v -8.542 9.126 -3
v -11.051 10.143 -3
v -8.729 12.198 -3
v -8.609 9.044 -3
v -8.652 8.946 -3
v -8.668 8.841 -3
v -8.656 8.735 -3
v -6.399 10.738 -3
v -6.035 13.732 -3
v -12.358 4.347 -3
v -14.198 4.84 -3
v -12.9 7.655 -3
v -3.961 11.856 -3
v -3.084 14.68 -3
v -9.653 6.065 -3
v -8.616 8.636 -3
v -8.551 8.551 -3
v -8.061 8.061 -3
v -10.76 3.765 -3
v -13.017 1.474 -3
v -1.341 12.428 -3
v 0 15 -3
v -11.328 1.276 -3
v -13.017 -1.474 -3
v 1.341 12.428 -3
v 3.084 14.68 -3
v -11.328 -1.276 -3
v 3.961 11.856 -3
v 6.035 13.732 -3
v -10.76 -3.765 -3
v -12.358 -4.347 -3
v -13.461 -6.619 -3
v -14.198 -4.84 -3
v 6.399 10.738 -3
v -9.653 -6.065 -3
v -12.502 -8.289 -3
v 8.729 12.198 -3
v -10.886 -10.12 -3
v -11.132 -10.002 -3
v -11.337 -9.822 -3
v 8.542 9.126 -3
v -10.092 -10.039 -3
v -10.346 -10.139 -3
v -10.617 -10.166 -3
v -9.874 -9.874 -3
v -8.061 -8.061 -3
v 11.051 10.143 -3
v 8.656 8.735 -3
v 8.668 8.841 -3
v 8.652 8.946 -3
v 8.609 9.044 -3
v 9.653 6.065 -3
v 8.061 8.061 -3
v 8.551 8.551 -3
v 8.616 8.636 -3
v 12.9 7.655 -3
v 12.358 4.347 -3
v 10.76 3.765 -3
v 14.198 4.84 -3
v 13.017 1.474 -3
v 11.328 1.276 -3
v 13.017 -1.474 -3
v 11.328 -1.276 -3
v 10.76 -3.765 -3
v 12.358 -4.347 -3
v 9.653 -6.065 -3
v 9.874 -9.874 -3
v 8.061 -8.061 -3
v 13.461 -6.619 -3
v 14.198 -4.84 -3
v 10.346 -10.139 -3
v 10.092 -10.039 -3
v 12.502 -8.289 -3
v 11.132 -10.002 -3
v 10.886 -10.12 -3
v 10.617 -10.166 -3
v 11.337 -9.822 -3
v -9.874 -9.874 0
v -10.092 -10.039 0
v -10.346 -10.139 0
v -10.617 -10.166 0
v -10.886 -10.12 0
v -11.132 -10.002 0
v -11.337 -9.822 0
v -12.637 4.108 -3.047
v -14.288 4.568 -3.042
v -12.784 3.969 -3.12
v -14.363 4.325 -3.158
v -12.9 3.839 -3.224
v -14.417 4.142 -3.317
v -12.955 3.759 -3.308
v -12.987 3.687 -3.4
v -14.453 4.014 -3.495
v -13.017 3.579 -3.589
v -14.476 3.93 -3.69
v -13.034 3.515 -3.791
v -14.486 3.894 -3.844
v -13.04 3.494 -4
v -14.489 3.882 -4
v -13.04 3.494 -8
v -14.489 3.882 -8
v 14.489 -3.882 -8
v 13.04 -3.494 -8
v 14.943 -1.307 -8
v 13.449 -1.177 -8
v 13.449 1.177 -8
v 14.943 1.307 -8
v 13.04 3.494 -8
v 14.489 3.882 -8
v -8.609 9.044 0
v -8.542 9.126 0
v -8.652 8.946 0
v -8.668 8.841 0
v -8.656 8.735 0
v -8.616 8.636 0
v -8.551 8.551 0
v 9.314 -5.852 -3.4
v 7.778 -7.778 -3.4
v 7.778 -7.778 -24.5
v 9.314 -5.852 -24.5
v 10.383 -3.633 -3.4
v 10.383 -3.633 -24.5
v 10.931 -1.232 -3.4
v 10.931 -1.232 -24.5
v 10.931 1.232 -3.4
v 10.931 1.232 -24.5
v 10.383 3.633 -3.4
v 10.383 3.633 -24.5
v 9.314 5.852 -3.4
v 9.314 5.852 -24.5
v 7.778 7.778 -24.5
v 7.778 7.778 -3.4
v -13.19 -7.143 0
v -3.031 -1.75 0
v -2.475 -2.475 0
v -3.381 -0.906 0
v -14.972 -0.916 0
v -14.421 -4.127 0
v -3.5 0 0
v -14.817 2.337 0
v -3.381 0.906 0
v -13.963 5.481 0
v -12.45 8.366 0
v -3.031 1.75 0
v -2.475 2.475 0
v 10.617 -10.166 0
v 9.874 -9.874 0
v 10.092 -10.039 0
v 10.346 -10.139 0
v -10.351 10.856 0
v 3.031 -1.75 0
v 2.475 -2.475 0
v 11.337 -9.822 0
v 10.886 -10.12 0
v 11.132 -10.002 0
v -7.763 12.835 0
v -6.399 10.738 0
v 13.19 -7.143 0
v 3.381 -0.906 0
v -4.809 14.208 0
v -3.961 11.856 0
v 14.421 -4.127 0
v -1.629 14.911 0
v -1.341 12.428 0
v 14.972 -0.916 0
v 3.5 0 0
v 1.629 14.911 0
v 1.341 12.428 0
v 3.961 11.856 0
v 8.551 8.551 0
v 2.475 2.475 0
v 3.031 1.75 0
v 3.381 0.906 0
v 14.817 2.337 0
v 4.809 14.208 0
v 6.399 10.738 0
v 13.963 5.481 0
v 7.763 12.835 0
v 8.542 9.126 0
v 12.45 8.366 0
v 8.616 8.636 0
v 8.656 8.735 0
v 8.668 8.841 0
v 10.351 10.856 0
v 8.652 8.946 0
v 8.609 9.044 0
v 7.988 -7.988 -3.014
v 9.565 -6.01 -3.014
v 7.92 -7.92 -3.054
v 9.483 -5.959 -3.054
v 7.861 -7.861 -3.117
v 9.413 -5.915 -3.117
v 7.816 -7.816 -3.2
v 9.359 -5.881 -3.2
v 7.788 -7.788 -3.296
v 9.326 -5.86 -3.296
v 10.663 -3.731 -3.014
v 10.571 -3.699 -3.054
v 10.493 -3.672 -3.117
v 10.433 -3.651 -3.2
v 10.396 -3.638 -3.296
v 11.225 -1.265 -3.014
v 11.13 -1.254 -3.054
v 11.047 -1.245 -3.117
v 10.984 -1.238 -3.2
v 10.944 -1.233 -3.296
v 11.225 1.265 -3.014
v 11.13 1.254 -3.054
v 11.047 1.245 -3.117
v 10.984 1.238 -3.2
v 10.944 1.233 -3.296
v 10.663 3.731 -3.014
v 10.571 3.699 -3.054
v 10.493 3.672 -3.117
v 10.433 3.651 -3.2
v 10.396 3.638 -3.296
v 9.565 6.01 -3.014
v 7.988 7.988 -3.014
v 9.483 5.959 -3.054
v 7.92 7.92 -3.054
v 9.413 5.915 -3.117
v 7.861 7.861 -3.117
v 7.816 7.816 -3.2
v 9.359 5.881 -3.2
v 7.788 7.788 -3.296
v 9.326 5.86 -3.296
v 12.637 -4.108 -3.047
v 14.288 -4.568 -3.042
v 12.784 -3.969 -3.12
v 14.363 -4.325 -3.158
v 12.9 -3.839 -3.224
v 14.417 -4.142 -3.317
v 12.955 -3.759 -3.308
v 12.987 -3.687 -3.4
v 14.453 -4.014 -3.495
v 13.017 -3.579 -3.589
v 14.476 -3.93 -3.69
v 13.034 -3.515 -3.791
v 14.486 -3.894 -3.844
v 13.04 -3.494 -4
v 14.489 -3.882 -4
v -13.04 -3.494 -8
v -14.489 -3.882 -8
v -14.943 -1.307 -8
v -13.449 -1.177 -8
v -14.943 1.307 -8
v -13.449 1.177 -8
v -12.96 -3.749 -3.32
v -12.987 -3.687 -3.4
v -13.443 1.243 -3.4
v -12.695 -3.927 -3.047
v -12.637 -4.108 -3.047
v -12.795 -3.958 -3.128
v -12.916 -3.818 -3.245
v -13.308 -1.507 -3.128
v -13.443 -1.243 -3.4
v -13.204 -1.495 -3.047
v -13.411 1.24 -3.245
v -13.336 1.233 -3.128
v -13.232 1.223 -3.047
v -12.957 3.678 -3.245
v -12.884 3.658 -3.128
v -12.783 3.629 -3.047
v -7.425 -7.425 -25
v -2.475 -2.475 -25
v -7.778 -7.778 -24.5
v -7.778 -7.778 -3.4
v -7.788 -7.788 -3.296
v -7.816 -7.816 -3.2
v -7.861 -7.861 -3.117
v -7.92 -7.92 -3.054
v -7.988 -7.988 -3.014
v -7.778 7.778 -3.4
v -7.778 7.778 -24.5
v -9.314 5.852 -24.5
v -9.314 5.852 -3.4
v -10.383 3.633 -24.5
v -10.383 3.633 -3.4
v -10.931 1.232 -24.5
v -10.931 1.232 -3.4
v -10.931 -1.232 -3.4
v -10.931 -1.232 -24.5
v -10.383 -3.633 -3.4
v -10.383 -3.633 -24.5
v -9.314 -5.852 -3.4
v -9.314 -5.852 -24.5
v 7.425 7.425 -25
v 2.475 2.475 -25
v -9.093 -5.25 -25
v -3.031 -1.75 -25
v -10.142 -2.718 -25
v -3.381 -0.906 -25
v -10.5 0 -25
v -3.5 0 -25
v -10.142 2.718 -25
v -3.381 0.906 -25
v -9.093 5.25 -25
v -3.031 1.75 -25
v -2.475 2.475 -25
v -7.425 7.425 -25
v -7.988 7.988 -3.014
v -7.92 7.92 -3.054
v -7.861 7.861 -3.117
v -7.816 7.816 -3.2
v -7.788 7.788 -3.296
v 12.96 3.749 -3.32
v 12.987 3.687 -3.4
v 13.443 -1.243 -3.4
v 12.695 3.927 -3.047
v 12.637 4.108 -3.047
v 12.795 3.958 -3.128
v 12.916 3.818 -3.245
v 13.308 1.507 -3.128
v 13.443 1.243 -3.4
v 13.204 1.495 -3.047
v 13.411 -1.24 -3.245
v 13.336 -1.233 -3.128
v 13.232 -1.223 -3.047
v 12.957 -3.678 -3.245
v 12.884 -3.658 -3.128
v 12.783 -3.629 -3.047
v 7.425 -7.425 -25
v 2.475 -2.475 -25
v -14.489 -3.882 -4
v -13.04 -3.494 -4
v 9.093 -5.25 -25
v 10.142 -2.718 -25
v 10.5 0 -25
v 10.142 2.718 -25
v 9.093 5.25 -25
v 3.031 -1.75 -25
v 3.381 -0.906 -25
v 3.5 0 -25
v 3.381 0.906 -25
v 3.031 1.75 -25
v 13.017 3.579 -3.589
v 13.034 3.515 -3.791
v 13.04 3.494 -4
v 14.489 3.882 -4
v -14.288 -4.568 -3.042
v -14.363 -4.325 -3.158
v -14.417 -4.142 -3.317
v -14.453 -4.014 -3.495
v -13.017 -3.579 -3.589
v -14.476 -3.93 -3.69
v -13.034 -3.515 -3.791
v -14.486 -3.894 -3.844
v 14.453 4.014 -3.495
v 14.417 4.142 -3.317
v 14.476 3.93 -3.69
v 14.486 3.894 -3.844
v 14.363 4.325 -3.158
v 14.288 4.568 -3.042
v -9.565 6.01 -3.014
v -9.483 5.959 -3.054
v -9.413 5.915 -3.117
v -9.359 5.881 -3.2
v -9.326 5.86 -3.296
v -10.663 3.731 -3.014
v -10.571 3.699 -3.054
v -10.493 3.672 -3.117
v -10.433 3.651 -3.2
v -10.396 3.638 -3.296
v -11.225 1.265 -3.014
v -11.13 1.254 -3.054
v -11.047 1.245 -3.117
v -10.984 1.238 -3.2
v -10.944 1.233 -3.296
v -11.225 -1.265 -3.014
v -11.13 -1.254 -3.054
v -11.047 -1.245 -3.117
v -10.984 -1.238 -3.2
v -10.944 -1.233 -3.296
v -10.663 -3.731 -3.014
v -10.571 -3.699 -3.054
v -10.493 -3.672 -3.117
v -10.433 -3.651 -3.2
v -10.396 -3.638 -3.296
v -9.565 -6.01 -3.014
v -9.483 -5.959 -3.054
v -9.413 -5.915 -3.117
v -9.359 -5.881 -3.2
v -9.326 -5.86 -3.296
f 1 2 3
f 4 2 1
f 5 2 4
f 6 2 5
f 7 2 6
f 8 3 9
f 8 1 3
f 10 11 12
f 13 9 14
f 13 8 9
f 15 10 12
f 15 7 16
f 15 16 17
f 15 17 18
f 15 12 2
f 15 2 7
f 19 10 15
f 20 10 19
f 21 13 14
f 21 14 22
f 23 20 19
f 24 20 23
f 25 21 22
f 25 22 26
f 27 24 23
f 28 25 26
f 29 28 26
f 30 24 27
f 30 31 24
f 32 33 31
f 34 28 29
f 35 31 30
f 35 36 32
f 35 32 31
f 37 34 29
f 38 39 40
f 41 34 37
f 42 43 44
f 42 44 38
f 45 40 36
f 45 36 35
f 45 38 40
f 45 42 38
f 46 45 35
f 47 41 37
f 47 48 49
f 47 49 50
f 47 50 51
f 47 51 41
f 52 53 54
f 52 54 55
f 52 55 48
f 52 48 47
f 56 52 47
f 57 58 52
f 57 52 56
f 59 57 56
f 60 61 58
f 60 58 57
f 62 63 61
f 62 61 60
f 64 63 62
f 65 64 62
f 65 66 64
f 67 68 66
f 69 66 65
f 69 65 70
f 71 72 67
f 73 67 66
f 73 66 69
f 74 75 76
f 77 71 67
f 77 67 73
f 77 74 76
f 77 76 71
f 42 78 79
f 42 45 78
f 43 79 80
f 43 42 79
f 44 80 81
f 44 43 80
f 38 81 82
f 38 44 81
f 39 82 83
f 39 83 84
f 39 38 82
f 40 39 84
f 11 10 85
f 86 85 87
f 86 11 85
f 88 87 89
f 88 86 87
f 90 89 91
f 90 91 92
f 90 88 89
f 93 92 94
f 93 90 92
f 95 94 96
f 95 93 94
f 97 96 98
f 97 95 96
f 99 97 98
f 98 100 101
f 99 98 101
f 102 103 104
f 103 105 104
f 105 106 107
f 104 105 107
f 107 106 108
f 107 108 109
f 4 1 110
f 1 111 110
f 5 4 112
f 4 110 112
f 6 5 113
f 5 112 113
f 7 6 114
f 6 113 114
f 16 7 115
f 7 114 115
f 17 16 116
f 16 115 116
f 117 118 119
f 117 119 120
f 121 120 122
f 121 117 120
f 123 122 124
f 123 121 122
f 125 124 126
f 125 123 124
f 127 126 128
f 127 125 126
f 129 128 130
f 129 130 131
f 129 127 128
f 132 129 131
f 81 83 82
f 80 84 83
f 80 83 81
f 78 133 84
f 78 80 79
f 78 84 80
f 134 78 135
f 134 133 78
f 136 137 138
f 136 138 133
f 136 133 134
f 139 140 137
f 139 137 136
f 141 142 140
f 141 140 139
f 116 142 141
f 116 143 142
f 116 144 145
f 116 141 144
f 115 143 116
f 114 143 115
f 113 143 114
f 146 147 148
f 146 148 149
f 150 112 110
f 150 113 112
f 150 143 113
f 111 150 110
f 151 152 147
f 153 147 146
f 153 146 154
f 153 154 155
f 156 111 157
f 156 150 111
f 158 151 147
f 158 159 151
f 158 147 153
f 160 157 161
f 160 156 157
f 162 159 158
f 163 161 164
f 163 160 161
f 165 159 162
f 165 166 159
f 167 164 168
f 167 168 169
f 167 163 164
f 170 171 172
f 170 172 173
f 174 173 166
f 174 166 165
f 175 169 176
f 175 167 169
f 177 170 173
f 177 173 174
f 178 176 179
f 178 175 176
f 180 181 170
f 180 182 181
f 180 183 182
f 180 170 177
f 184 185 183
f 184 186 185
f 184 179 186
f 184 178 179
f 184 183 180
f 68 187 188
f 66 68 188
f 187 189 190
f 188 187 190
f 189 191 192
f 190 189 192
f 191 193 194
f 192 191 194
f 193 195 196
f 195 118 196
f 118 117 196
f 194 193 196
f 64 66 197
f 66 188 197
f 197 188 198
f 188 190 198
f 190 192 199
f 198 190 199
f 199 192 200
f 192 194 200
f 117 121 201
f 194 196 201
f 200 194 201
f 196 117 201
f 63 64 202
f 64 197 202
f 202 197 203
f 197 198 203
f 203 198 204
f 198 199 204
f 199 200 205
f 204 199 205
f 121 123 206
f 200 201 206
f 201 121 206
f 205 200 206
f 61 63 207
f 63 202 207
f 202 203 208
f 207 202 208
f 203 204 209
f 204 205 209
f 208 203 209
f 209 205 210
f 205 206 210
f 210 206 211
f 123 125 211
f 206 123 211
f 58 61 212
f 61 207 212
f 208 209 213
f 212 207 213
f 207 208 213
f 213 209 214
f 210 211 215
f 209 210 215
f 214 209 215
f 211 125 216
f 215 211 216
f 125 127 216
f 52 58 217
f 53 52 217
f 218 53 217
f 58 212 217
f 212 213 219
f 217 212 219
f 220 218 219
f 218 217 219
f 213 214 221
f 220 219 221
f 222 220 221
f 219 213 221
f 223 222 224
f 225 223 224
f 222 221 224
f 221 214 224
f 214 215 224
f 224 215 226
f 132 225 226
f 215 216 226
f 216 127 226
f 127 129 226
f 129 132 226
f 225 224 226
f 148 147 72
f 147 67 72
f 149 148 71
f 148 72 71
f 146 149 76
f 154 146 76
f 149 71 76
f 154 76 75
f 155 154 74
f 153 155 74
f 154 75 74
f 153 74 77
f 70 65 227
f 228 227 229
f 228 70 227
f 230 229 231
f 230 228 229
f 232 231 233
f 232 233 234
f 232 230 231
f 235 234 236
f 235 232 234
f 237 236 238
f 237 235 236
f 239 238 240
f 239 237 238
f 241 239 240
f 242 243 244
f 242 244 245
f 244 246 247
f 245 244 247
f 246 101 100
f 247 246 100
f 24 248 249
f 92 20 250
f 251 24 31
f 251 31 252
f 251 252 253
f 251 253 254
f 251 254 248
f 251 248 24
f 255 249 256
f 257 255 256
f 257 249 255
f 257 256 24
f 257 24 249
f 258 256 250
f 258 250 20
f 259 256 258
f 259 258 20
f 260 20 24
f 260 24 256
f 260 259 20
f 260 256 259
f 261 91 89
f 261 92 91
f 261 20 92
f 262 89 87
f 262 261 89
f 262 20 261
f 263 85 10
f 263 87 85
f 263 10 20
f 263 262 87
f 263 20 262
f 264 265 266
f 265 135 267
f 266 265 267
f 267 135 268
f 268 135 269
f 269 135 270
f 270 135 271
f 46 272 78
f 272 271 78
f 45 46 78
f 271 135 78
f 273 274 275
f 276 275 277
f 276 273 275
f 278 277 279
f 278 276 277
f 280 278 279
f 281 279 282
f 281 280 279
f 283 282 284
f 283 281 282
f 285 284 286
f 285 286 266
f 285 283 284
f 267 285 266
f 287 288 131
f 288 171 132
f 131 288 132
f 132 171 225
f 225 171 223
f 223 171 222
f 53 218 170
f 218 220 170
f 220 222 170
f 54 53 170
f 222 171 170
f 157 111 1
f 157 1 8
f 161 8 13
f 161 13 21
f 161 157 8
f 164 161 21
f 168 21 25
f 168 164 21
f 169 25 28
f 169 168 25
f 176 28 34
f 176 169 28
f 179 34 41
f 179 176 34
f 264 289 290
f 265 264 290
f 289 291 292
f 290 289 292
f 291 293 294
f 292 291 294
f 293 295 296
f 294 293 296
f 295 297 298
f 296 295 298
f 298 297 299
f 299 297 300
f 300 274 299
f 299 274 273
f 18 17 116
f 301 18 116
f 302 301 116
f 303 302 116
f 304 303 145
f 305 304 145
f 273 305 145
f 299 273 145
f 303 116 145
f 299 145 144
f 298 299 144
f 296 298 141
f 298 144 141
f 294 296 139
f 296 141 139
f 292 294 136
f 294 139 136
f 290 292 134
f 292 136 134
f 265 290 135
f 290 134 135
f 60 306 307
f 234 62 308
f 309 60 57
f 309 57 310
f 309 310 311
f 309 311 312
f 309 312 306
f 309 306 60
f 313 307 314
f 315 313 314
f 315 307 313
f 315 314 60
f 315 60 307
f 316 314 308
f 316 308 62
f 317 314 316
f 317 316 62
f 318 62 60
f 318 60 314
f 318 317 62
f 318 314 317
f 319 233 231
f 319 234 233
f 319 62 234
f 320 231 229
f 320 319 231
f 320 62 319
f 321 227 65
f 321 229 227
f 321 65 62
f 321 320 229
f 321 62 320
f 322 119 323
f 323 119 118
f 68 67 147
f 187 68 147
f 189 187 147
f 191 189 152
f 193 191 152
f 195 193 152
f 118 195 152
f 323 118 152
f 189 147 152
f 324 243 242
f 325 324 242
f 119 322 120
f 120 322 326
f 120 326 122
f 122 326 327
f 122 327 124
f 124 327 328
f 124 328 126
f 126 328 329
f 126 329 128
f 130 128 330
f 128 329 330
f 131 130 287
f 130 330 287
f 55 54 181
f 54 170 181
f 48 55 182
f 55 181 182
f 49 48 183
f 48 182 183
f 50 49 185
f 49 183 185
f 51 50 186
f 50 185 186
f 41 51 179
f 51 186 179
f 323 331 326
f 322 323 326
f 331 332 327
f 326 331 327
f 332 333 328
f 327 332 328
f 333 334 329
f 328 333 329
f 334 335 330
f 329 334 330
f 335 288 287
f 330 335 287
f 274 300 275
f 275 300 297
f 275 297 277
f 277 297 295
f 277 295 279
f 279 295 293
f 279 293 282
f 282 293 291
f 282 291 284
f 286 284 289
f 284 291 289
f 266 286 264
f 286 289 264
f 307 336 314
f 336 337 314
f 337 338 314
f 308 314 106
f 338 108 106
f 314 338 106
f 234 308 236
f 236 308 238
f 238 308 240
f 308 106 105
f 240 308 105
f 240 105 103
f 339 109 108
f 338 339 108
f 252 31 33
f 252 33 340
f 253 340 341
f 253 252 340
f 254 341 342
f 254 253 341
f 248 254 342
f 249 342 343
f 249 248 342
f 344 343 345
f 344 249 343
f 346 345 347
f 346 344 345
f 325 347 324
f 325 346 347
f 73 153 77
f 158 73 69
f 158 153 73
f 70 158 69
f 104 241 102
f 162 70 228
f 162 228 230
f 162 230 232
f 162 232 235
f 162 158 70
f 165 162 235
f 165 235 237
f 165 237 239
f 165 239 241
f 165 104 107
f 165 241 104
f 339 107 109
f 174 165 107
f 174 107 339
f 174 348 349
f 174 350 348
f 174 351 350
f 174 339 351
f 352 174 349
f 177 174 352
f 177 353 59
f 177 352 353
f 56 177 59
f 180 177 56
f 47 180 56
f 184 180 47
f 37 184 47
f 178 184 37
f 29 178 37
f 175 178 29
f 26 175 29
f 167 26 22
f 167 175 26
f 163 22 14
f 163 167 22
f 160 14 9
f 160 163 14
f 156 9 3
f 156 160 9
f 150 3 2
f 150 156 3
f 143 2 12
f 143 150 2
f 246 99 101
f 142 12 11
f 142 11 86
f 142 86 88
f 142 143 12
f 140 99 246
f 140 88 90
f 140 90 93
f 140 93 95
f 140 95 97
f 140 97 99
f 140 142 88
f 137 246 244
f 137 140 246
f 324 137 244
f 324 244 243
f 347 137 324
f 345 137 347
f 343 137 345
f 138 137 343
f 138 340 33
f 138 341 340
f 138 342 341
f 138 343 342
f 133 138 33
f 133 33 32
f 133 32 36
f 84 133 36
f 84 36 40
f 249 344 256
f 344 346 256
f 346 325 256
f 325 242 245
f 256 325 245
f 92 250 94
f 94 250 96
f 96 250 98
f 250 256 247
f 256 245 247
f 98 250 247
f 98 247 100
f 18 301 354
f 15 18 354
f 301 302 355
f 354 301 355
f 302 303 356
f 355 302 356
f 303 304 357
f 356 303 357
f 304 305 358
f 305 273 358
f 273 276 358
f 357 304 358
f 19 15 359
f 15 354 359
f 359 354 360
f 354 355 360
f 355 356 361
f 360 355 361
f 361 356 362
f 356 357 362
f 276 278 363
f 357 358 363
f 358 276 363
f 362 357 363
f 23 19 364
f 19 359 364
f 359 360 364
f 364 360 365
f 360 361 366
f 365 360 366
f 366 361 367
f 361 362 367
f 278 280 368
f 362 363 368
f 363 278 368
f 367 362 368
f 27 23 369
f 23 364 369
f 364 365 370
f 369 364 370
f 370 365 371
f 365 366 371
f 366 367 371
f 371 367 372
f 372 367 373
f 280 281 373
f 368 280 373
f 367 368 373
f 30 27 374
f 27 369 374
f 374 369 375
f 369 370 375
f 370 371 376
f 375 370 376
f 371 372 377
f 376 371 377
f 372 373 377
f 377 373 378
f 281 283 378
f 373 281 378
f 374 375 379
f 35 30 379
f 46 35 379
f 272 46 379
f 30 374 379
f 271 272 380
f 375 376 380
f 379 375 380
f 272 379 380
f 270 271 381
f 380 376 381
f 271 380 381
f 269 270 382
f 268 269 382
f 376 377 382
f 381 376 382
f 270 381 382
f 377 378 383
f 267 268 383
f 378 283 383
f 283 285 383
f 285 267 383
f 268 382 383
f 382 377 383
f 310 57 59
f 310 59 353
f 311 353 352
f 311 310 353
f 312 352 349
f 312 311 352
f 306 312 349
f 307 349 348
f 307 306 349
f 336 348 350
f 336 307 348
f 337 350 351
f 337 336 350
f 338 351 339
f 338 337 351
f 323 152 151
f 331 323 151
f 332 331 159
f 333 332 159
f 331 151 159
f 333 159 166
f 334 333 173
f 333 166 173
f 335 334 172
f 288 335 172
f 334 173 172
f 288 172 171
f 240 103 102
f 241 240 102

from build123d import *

# Parameters (mm, degrees)
F0_R      = 11
F0_R_2    = 3.5
F1_DEPTH  = 25
F2_R      = 15
F2_R_2    = 3.5
F3_DEPTH  = 8
F4_R      = 13.5
F4_R_2    = 11
F5_DEPTH  = 5
F6_R      = 0.4
F8_DEPTH  = 25
F10_DEPTH = 5
F12_R     = 1
F13_SIZE  = 0.5
F15_DEPTH = 3
F16_R     = 0.4


# Not quite as in the source:
# - a feature of the source that left no trace in its solid (it failed there, or was rolled back) is left out


with BuildPart() as f1:
    # F0 (on Top) → F1 (new body)
    with BuildSketch(Plane.XY):
        Circle(F0_R)
        Circle(F0_R_2, mode=Mode.SUBTRACT)
    extrude(amount=-F1_DEPTH)

    # F2 (on Top) → F3 (join)
    with BuildSketch(Plane.XY):
        Circle(F2_R)
        Circle(F2_R_2, mode=Mode.SUBTRACT)
    extrude(amount=-F3_DEPTH)

    # F4 (on face) → F5 (cut)
    with BuildSketch(Plane(origin=(0, 0, -8), x_dir=(1, 0, 0), z_dir=(0, 0, -1))):
        Circle(F4_R)
        Circle(F4_R_2, mode=Mode.SUBTRACT)
    extrude(amount=-F5_DEPTH, mode=Mode.SUBTRACT)

    # F6
    f6_edges = [f1.edges().sort_by_distance(p)[0] for p in [
        (-13.5, 0, -3),
    ]]
    fillet(f6_edges, radius=F6_R)

    # F7 (on Top) → F8 (cut)
    with BuildSketch(Plane.XY):
        with BuildLine():
            ThreePointArc((-2.4748737342, 2.4748737342), (0, 3.5), (2.4748737342, 2.4748737342))
            Line((2.4748737342, 2.4748737342), (10.6066017178, 10.6066017178))
            ThreePointArc((10.6066017178, 10.6066017178), (0, 15), (-10.6066017178, 10.6066017178))
            Line((-10.6066017178, 10.6066017178), (-2.4748737342, 2.4748737342))
        make_face()
        with BuildLine():
            Line((10.6066017178, -10.6066017178), (2.4748737342, -2.4748737342))
            ThreePointArc((2.4748737342, -2.4748737342), (0, -3.5), (-2.4748737342, -2.4748737342))
            Line((-2.4748737342, -2.4748737342), (-10.6066017178, -10.6066017178))
            ThreePointArc((-10.6066017178, -10.6066017178), (0, -15), (10.6066017178, -10.6066017178))
        make_face()
    extrude(amount=-F8_DEPTH, mode=Mode.SUBTRACT)

    # F9 (on face) → F10 (cut, through all)
    with BuildSketch(Plane(origin=(0, 0, -8), x_dir=(1, 0, 0), z_dir=(0, 0, -1))):
        with BuildLine():
            ThreePointArc((-10.6251840892, 2.8470094961), (0, 11), (10.6251840892, 2.8470094961))
            Line((10.6251840892, 2.8470094961), (15.4548132206, 4.1411047216))
            ThreePointArc((15.4548132206, 4.1411047216), (0, 16), (-15.4548132206, 4.1411047216))
            Line((-15.4548132206, 4.1411047216), (-10.6251840892, 2.8470094961))
        make_face()
        with BuildLine():
            Line((15.4548132206, -4.1411047216), (10.6251840892, -2.8470094961))
            ThreePointArc((10.6251840892, -2.8470094961), (0, -11), (-10.6251840892, -2.8470094961))
            Line((-10.6251840892, -2.8470094961), (-15.4548132206, -4.1411047216))
            ThreePointArc((-15.4548132206, -4.1411047216), (0, -16), (15.4548132206, -4.1411047216))
        make_face()
    extrude(amount=-F10_DEPTH, mode=Mode.SUBTRACT)

    # F12 (call 1 of 6: OpenCascade refuses the feature's edges together)
    f12_edges = [f1.edges().sort_by_distance(p)[0] for p in [
        (10.606602, -10.606602, -1.5),
    ]]
    fillet(f12_edges, radius=F12_R)

    # F12#2 (call 2 of 6)
    f12_2_edges = [f1.edges().sort_by_distance(p)[0] for p in [
        (-10.606602, -10.606602, -1.5),
    ]]
    fillet(f12_2_edges, radius=F12_R)

    # F12#3 (call 3 of 6)
    f12_3_edges = [f1.edges().sort_by_distance(p)[0] for p in [
        (13.571258, -3.636408, -3),
    ]]
    fillet(f12_3_edges, radius=F12_R)

    # F12#4 (call 4 of 6)
    f12_4_edges = [f1.edges().sort_by_distance(p)[0] for p in [
        (13.571258, 3.636408, -3),
    ]]
    fillet(f12_4_edges, radius=F12_R)

    # F12#5 (call 5 of 6)
    f12_5_edges = [f1.edges().sort_by_distance(p)[0] for p in [
        (-13.571258, -3.636408, -3),
    ]]
    fillet(f12_5_edges, radius=F12_R)

    # F12#6 (call 6 of 6)
    f12_6_edges = [f1.edges().sort_by_distance(p)[0] for p in [
        (-13.571258, 3.636408, -3),
    ]]
    fillet(f12_6_edges, radius=F12_R)

    # F13
    f13_edges = [f1.edges().sort_by_distance(p)[0] for p in [
        (-11, 0, -25),
        (11, 0, -25),
    ]]
    chamfer(f13_edges, length=F13_SIZE)

    # F14 (on Top) → F15 (join)
    with BuildSketch(Plane.XY):
        with BuildLine():
            Line((12.5, 0), (15, 0))
            ThreePointArc((15, 0), (0, 15), (-15, 0))
            Line((-15, 0), (-12.5, 0))
            ThreePointArc((-12.5, 0), (0, 12.5), (12.5, 0))
        make_face()
    extrude(amount=-F15_DEPTH)

    # F16
    f16_edges = [f1.edges().sort_by_distance(p)[0] for p in [
        (11, 0, -3),
        (-11, 0, -3),
        (-8.838835, 8.838835, -1.5),
        (8.838835, 8.838835, -1.5),
    ]]
    fillet(f16_edges, radius=F16_R)


solid = f1.part
